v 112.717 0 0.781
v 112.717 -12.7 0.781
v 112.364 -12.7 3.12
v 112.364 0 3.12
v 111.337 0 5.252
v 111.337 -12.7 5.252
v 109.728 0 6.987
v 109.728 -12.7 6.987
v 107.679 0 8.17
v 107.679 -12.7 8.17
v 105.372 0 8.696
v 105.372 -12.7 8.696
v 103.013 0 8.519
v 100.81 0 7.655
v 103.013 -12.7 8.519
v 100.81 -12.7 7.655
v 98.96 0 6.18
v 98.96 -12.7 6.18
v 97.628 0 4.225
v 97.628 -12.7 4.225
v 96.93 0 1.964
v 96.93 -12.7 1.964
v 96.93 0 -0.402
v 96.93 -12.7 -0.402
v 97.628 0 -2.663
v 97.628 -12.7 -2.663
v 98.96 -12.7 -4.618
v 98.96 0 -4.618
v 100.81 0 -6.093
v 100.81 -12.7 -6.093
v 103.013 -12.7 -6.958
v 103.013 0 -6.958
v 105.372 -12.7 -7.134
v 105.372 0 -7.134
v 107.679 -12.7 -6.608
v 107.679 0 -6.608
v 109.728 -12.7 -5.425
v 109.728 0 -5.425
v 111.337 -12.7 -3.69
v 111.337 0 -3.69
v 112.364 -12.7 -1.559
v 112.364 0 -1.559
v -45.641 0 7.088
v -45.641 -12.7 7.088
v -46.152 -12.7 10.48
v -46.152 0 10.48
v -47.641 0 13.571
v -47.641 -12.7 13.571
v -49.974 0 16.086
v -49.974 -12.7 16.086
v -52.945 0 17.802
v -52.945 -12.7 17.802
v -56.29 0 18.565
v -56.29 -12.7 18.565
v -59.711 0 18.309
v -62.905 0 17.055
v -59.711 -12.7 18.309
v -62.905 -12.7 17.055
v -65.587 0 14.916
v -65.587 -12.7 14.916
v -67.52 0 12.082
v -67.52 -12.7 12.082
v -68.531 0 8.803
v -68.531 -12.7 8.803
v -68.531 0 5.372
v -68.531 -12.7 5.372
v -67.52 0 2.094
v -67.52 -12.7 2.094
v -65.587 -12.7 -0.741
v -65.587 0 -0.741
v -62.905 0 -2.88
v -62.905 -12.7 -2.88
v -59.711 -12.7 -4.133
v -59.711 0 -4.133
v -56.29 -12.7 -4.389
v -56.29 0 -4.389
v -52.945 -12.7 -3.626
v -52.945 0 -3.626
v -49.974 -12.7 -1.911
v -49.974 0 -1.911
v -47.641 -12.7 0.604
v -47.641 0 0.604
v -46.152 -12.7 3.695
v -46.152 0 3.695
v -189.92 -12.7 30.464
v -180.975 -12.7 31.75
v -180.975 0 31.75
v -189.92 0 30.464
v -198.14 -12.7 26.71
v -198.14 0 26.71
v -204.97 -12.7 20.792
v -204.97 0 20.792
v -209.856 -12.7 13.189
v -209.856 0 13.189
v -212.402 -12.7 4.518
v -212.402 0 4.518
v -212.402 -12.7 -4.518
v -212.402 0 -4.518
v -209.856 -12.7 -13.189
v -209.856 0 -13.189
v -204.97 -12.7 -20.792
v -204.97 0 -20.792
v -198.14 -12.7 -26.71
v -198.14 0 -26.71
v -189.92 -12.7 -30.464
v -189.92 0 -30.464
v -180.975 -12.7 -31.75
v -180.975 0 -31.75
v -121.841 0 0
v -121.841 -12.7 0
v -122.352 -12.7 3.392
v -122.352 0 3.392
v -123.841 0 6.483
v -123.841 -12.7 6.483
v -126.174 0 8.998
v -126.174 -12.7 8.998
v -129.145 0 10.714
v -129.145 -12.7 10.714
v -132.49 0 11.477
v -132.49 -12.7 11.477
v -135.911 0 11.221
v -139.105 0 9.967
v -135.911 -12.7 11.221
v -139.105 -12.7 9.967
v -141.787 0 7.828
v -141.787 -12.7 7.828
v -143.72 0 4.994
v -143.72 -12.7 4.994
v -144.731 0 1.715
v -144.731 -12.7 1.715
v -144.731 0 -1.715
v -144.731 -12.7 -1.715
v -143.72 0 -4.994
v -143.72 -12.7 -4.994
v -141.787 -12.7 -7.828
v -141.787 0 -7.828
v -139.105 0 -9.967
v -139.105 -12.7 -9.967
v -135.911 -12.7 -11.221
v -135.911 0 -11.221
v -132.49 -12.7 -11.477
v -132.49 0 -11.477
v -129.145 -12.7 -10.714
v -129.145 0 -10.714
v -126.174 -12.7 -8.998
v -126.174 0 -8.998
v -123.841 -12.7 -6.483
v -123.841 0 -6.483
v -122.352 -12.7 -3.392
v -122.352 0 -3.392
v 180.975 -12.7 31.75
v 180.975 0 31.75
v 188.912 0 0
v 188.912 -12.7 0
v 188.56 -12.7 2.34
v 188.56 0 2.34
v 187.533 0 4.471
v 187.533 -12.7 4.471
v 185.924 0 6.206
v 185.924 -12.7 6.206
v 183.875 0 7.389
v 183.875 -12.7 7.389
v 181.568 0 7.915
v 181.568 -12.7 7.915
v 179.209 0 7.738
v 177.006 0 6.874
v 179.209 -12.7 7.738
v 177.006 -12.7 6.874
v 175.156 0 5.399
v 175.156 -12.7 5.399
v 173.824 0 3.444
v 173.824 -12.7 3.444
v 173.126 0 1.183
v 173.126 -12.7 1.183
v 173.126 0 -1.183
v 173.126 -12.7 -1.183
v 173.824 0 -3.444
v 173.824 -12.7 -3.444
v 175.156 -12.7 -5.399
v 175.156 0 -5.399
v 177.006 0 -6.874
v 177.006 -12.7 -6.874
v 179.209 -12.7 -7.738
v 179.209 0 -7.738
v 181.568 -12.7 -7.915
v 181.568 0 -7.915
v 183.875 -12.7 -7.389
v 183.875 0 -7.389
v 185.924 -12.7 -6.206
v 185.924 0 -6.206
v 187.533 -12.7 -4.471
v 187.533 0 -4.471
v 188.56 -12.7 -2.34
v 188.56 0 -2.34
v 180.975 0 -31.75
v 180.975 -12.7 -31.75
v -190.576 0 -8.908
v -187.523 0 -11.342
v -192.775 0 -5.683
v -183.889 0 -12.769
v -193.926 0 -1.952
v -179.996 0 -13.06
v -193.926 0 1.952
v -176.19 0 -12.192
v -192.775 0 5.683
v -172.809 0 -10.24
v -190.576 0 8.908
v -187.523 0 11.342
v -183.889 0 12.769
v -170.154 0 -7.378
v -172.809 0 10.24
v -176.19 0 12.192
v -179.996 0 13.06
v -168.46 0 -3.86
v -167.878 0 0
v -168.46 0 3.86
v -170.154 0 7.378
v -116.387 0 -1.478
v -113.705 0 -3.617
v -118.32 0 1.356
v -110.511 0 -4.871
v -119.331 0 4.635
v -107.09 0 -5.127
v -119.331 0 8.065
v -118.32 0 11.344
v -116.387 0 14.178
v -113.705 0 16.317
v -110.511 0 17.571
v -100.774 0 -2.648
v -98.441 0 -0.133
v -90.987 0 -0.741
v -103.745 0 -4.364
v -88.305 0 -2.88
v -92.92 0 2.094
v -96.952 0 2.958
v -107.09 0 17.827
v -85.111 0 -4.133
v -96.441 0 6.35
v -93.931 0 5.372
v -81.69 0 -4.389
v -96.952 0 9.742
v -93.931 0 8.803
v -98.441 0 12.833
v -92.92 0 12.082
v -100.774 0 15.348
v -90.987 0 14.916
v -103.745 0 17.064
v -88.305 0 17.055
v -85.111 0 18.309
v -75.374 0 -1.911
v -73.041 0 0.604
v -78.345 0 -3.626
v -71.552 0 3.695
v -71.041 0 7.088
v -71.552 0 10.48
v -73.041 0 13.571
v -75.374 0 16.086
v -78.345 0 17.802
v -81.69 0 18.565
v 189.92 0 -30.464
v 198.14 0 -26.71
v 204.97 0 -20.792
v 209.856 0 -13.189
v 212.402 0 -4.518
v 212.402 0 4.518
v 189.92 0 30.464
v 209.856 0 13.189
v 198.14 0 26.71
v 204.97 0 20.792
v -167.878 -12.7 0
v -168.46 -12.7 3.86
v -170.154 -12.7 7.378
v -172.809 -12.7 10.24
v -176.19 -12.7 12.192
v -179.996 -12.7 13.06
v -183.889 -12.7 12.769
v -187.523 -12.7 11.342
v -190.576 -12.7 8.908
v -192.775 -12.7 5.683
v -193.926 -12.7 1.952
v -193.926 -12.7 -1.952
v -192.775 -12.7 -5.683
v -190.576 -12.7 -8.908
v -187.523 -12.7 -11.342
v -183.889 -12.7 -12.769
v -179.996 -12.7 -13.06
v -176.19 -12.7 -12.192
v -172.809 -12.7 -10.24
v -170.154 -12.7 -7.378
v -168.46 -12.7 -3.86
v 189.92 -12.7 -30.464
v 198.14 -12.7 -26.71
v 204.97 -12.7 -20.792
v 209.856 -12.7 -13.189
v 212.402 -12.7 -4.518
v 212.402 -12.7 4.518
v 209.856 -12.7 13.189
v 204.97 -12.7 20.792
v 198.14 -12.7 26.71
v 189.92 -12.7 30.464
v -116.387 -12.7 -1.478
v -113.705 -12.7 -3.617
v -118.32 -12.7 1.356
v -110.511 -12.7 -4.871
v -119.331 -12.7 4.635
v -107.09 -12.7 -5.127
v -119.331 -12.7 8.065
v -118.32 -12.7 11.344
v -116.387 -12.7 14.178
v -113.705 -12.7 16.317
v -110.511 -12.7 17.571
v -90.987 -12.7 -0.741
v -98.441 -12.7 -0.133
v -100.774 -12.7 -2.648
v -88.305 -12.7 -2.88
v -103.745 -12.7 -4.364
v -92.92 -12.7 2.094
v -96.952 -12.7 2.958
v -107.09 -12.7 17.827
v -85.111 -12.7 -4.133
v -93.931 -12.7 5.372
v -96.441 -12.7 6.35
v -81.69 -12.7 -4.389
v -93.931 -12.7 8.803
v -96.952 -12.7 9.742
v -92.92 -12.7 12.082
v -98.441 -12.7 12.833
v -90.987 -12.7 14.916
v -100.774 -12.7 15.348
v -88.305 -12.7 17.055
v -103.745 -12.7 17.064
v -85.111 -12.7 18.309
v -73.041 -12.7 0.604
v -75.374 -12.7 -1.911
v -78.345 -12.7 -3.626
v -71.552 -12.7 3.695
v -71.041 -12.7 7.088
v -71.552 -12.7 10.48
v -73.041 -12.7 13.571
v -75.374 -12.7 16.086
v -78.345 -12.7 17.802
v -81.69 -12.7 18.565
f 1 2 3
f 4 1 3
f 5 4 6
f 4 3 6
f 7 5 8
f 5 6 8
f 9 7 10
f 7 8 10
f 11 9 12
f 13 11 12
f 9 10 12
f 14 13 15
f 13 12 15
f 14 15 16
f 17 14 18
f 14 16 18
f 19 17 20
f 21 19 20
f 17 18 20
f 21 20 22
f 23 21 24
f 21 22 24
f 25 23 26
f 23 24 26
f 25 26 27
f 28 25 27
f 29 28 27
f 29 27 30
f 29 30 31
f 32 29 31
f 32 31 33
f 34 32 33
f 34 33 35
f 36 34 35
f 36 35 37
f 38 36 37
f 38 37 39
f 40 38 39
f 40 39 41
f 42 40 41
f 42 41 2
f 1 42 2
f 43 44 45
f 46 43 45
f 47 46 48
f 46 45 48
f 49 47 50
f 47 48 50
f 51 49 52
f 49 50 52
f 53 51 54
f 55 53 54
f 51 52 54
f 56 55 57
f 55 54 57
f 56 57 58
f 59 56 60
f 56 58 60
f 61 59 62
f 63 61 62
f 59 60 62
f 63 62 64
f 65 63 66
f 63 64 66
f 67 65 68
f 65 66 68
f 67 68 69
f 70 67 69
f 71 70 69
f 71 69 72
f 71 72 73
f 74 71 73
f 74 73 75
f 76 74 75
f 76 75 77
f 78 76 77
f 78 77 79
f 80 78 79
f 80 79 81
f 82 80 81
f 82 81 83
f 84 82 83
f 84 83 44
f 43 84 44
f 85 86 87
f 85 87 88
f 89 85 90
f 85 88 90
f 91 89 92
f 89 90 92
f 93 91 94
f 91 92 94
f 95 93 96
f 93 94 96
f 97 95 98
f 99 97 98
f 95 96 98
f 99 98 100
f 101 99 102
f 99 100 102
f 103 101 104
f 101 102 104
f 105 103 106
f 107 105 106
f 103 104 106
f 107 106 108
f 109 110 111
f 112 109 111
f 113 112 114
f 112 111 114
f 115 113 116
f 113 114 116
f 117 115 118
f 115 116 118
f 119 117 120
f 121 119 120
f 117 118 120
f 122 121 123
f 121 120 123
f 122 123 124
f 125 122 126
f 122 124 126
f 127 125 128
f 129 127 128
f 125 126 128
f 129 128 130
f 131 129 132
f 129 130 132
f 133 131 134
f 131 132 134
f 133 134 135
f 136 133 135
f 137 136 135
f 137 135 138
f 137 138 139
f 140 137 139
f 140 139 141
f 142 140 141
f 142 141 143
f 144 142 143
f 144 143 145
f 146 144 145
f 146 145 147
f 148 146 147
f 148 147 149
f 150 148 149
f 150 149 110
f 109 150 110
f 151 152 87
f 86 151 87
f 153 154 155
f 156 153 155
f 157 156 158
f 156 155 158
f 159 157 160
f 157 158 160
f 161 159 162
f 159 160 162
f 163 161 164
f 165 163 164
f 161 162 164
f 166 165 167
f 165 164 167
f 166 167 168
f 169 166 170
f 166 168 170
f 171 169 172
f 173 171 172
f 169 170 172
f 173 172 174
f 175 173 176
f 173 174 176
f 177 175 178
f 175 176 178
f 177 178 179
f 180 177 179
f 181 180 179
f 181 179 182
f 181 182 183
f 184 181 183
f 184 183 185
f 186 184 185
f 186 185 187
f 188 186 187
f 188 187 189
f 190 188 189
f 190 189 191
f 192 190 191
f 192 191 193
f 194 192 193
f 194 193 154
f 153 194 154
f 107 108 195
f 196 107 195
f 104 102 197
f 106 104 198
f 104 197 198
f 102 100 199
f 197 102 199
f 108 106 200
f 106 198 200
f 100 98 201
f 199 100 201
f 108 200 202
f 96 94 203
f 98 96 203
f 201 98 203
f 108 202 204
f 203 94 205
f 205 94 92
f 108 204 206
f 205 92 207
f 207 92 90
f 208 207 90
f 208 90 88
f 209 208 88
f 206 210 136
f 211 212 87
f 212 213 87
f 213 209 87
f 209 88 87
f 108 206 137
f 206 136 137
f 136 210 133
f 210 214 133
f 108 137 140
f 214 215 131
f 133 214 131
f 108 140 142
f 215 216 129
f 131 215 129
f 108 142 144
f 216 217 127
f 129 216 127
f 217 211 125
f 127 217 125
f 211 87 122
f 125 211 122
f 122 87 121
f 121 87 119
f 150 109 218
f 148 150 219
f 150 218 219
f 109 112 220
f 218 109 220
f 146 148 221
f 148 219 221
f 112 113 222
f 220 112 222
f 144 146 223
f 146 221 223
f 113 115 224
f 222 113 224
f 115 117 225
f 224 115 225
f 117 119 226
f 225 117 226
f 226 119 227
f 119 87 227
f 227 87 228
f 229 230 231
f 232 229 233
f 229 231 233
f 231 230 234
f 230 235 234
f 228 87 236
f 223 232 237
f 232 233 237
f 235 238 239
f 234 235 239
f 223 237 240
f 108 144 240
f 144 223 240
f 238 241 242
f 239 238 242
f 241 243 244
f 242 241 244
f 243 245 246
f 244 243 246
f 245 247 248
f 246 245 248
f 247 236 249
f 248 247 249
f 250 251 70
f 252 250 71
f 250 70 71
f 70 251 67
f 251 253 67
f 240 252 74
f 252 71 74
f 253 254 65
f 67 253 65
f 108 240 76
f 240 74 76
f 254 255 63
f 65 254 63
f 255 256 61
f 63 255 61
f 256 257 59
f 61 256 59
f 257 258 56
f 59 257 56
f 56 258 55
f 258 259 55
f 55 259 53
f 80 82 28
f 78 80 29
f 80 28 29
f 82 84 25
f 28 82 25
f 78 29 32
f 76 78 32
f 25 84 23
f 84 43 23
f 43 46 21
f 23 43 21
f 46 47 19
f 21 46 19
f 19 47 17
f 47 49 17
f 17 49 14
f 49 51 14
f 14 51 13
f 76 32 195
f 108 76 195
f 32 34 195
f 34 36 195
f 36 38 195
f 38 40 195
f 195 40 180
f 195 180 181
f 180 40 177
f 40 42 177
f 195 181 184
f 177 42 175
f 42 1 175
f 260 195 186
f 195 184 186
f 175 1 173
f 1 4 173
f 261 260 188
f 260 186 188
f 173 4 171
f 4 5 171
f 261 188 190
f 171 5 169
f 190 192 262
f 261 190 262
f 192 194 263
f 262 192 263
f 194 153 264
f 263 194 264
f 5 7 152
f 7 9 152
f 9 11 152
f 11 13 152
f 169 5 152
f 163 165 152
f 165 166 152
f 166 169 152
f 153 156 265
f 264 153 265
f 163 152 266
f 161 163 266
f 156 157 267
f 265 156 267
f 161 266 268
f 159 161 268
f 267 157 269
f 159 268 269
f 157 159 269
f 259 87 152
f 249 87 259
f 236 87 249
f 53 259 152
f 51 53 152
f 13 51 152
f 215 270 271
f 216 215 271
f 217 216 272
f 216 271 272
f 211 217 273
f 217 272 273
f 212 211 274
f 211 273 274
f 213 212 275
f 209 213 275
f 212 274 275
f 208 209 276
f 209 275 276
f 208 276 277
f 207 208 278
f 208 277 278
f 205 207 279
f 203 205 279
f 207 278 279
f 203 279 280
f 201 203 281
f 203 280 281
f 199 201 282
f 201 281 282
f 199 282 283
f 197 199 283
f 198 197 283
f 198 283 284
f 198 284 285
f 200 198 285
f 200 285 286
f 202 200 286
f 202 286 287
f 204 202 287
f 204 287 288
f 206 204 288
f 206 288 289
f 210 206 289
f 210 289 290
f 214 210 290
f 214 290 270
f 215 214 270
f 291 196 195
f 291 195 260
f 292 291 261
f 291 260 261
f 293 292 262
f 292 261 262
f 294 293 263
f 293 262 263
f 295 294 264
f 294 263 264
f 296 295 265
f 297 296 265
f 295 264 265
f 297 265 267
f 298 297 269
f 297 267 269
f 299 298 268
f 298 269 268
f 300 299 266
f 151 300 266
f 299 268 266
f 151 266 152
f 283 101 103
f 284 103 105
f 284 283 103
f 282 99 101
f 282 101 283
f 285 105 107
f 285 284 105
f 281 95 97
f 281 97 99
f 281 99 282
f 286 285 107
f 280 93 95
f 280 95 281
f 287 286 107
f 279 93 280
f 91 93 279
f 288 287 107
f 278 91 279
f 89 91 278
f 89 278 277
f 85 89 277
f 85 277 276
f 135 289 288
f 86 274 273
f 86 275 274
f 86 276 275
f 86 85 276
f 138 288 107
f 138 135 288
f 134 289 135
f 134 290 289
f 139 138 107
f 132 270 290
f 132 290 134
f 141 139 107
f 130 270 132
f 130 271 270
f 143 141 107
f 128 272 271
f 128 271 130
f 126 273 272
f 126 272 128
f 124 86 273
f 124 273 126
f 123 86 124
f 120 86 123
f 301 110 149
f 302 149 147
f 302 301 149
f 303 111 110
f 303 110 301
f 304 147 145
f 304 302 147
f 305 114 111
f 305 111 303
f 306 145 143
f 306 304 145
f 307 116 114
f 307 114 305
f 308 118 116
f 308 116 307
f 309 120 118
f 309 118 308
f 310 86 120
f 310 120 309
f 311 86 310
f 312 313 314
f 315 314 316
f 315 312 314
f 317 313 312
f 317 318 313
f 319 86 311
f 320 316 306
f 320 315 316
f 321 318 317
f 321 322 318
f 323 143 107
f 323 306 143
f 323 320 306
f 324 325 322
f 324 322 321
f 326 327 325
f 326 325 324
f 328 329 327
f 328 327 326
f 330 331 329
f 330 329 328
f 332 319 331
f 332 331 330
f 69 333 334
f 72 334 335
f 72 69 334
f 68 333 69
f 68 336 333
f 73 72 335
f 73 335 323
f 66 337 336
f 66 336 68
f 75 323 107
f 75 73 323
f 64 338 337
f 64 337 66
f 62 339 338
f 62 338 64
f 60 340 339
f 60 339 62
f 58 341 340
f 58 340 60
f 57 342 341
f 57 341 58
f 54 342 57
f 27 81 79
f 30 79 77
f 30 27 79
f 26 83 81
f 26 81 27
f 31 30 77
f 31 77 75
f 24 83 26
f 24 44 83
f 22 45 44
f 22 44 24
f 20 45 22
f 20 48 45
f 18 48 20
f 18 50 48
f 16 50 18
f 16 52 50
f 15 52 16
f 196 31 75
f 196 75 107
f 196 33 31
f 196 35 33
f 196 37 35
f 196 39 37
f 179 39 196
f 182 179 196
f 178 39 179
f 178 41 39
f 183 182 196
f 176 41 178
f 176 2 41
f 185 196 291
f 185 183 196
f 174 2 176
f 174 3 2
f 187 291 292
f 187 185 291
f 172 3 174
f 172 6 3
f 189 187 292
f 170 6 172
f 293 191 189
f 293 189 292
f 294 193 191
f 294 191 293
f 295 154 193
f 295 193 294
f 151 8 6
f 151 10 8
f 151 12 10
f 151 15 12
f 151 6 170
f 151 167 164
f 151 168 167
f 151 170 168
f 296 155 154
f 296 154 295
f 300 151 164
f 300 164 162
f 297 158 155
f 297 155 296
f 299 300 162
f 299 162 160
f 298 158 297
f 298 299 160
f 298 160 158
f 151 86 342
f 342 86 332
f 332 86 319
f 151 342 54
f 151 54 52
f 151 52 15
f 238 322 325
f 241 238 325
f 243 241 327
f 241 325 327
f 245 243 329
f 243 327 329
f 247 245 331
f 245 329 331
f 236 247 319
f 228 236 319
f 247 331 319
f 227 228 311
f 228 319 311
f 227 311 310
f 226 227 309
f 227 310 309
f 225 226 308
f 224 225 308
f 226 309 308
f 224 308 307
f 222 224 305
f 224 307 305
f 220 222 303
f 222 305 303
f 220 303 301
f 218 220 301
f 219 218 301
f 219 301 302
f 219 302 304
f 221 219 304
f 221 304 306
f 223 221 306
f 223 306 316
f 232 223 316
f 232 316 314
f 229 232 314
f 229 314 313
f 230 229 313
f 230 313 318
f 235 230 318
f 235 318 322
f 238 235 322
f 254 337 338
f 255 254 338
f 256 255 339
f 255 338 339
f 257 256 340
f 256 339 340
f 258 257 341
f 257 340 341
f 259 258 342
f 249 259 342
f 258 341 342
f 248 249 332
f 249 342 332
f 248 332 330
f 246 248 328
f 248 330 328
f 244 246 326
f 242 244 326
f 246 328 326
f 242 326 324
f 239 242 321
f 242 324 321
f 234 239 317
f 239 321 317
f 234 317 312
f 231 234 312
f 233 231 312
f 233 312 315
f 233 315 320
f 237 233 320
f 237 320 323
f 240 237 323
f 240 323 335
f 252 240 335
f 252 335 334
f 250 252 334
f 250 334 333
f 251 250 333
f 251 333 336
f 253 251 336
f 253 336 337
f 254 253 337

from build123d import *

# Parameters (mm, degrees)
F0_W      = 419.1
F0_H      = 88.9
F0_R      = 13.096875
F0_R_2    = 11.509375
F0_R_3    = 10.31875
F1_DEPTH  = 12.7
F2_R      = 11.509375
F3_DEPTH  = 12.701
F5_DEPTH  = 12.701
F7_DEPTH  = 12.7010001
F9_DEPTH  = 12.7
F10_R     = 13.096875
F10_R_2   = 11.509375
F10_R_3   = 7.9375
F11_DEPTH = 25.4010001


with BuildPart() as f1:
    # F0 (on Front) → F1 (new body)
    with BuildSketch(Plane.XZ):
        Rectangle(F0_W, F0_H)
        with Locations((-177.8, -12.7)):
            Circle(F0_R, mode=Mode.SUBTRACT)
        with Locations((-12.7, -18.7318846583)):
            Circle(F0_R_2, mode=Mode.SUBTRACT)
        with Locations((19.05, -19.1783625633)):
            Circle(F0_R_2, mode=Mode.SUBTRACT)
        with Locations((50.8, -18.7318846583)):
            Circle(F0_R_2, mode=Mode.SUBTRACT)
        with Locations((82.55, -19.05)):
            Circle(F0_R_2, mode=Mode.SUBTRACT)
        with Locations((133.35, -12.7)):
            Circle(F0_R_3, mode=Mode.SUBTRACT)
        with Locations((184.15, -12.7)):
            Circle(F0_R_3, mode=Mode.SUBTRACT)
    extrude(amount=-F1_DEPTH)

    # F2 (on face) → F3 (cut, through all)
    with BuildSketch(Plane.XZ):
        with Locations((-142.08252, 18.4232164174)):
            Circle(F2_R)
        with Locations((-104.306563735, 14.0248946846)):
            Circle(F2_R)
        with Locations((-71.5190842748, 1.6296281246)):
            Circle(F2_R)
        with Locations((-45.7596568011, -14.1053809535)):
            Circle(F2_R)
    extrude(amount=-F3_DEPTH, mode=Mode.SUBTRACT)

    # F4 (on face) → F5 (cut, through all)
    with BuildSketch(Plane.XZ):
        with BuildLine():
            ThreePointArc((-209.55, -12.7), (-207.0936907923, -0.4549120148), (-200.1048233219, 9.8955162937))
            Line((-200.1048233219, 9.8955162937), (-165.1, 44.45))
            Line((-165.1, 44.45), (-209.55, 44.45))
            Line((-209.55, 44.45), (-209.55, -12.7))
        make_face()
        with BuildLine():
            Line((-209.55, -44.45), (-177.8, -44.45))
            ThreePointArc((-177.8, -44.45), (-200.2506403027, -35.1506403027), (-209.55, -12.7))
            Line((-209.55, -12.7), (-209.55, -44.45))
        make_face()
        with BuildLine():
            ThreePointArc((-146.0861882684, -11.1845312756), (-146.0590483564, -11.9420496313), (-146.05, -12.7))
            ThreePointArc((-146.05, -12.7), (-155.3493596973, -35.1506403027), (-177.8, -44.45))
            Line((-177.8, -44.45), (-38.1, -44.45))
            add(Edge.make_bspline(
                [(-135.731991463, -1.5425124657), (-123.0853934374, -3.2529361125), (-97.8098704079, -7.8915227069), (-55.1757360667, -37.2664877617), (-44.6494842281, -43.1637651569), (-38.1, -44.45)],
                knots=[0, 0, 0, 0, 0.3555356426, 0.7550234425, 1, 1, 1, 1], degree=3))
            ThreePointArc((-135.731991463, -1.5425124657), (-142.8632378904, -4.2650367263), (-146.0861882684, -11.1845312756))
        make_face()
    extrude(amount=-F5_DEPTH, mode=Mode.SUBTRACT)

    # F6 (on face) → F7 (cut, through all)
    with BuildSketch(Plane.XZ):
        with BuildLine():
            Line((209.55, 44.45), (163.5125, 44.45))
            Line((163.5125, 44.45), (202.2463189928, 5.1236707474))
            ThreePointArc((202.2463189928, 5.1236707474), (207.6532604037, -3.0689694011), (209.55, -12.6999998198))
            Line((209.55, -12.6999998198), (209.55, 44.45))
        make_face()
        with BuildLine():
            Line((209.55, -44.45), (209.55, -12.6999998198))
            ThreePointArc((209.55, -12.6999998198), (206.8684506917, -24.0592252451), (199.39, -33.02))
            Line((199.39, -33.02), (184.15, -44.45))
            Line((184.15, -44.45), (209.55, -44.45))
        make_face()
    extrude(amount=-F7_DEPTH, mode=Mode.SUBTRACT)


with BuildPart() as f9:
    # F8 (on Front) → F9 (new body)
    with BuildSketch(Plane.XZ):
        with BuildLine():
            Line((180.975, 31.75), (-180.975, 31.75))
            ThreePointArc((-180.975, 31.75), (-212.725, 0), (-180.975, -31.75))
            Line((-180.975, -31.75), (180.975, -31.75))
            ThreePointArc((180.975, -31.75), (212.725, 0), (180.975, 31.75))
        make_face()
    extrude(amount=F9_DEPTH)


with BuildPart() as f11_tool:
    # F10 (on face) → F11 (new body, through all)
    with BuildSketch(Plane.XZ.offset(12.7)):
        with Locations((-180.975, 0)):
            Circle(F10_R)
        with Locations((-133.35, 0)):
            Circle(F10_R_2)
        with Locations((-107.95, 6.35)):
            Circle(F10_R_2)
        with Locations((-82.55, 7.0877922699)):
            Circle(F10_R_2)
        with Locations((-57.15, 7.0877922699)):
            Circle(F10_R_2)
        with Locations((104.7790011828, 0.7808740327)):
            Circle(F10_R_3)
        with Locations((180.975, 0)):
            Circle(F10_R_3)
    extrude(amount=-F11_DEPTH)


with BuildPart() as f1_1:
    add(f1.part)

    # F11: cut by f11_tool
    add(f11_tool.part, mode=Mode.SUBTRACT)


with BuildPart() as f9_1:
    add(f9.part)

    # F11: cut by f11_tool
    add(f11_tool.part, mode=Mode.SUBTRACT)


solid = f9_1.part
